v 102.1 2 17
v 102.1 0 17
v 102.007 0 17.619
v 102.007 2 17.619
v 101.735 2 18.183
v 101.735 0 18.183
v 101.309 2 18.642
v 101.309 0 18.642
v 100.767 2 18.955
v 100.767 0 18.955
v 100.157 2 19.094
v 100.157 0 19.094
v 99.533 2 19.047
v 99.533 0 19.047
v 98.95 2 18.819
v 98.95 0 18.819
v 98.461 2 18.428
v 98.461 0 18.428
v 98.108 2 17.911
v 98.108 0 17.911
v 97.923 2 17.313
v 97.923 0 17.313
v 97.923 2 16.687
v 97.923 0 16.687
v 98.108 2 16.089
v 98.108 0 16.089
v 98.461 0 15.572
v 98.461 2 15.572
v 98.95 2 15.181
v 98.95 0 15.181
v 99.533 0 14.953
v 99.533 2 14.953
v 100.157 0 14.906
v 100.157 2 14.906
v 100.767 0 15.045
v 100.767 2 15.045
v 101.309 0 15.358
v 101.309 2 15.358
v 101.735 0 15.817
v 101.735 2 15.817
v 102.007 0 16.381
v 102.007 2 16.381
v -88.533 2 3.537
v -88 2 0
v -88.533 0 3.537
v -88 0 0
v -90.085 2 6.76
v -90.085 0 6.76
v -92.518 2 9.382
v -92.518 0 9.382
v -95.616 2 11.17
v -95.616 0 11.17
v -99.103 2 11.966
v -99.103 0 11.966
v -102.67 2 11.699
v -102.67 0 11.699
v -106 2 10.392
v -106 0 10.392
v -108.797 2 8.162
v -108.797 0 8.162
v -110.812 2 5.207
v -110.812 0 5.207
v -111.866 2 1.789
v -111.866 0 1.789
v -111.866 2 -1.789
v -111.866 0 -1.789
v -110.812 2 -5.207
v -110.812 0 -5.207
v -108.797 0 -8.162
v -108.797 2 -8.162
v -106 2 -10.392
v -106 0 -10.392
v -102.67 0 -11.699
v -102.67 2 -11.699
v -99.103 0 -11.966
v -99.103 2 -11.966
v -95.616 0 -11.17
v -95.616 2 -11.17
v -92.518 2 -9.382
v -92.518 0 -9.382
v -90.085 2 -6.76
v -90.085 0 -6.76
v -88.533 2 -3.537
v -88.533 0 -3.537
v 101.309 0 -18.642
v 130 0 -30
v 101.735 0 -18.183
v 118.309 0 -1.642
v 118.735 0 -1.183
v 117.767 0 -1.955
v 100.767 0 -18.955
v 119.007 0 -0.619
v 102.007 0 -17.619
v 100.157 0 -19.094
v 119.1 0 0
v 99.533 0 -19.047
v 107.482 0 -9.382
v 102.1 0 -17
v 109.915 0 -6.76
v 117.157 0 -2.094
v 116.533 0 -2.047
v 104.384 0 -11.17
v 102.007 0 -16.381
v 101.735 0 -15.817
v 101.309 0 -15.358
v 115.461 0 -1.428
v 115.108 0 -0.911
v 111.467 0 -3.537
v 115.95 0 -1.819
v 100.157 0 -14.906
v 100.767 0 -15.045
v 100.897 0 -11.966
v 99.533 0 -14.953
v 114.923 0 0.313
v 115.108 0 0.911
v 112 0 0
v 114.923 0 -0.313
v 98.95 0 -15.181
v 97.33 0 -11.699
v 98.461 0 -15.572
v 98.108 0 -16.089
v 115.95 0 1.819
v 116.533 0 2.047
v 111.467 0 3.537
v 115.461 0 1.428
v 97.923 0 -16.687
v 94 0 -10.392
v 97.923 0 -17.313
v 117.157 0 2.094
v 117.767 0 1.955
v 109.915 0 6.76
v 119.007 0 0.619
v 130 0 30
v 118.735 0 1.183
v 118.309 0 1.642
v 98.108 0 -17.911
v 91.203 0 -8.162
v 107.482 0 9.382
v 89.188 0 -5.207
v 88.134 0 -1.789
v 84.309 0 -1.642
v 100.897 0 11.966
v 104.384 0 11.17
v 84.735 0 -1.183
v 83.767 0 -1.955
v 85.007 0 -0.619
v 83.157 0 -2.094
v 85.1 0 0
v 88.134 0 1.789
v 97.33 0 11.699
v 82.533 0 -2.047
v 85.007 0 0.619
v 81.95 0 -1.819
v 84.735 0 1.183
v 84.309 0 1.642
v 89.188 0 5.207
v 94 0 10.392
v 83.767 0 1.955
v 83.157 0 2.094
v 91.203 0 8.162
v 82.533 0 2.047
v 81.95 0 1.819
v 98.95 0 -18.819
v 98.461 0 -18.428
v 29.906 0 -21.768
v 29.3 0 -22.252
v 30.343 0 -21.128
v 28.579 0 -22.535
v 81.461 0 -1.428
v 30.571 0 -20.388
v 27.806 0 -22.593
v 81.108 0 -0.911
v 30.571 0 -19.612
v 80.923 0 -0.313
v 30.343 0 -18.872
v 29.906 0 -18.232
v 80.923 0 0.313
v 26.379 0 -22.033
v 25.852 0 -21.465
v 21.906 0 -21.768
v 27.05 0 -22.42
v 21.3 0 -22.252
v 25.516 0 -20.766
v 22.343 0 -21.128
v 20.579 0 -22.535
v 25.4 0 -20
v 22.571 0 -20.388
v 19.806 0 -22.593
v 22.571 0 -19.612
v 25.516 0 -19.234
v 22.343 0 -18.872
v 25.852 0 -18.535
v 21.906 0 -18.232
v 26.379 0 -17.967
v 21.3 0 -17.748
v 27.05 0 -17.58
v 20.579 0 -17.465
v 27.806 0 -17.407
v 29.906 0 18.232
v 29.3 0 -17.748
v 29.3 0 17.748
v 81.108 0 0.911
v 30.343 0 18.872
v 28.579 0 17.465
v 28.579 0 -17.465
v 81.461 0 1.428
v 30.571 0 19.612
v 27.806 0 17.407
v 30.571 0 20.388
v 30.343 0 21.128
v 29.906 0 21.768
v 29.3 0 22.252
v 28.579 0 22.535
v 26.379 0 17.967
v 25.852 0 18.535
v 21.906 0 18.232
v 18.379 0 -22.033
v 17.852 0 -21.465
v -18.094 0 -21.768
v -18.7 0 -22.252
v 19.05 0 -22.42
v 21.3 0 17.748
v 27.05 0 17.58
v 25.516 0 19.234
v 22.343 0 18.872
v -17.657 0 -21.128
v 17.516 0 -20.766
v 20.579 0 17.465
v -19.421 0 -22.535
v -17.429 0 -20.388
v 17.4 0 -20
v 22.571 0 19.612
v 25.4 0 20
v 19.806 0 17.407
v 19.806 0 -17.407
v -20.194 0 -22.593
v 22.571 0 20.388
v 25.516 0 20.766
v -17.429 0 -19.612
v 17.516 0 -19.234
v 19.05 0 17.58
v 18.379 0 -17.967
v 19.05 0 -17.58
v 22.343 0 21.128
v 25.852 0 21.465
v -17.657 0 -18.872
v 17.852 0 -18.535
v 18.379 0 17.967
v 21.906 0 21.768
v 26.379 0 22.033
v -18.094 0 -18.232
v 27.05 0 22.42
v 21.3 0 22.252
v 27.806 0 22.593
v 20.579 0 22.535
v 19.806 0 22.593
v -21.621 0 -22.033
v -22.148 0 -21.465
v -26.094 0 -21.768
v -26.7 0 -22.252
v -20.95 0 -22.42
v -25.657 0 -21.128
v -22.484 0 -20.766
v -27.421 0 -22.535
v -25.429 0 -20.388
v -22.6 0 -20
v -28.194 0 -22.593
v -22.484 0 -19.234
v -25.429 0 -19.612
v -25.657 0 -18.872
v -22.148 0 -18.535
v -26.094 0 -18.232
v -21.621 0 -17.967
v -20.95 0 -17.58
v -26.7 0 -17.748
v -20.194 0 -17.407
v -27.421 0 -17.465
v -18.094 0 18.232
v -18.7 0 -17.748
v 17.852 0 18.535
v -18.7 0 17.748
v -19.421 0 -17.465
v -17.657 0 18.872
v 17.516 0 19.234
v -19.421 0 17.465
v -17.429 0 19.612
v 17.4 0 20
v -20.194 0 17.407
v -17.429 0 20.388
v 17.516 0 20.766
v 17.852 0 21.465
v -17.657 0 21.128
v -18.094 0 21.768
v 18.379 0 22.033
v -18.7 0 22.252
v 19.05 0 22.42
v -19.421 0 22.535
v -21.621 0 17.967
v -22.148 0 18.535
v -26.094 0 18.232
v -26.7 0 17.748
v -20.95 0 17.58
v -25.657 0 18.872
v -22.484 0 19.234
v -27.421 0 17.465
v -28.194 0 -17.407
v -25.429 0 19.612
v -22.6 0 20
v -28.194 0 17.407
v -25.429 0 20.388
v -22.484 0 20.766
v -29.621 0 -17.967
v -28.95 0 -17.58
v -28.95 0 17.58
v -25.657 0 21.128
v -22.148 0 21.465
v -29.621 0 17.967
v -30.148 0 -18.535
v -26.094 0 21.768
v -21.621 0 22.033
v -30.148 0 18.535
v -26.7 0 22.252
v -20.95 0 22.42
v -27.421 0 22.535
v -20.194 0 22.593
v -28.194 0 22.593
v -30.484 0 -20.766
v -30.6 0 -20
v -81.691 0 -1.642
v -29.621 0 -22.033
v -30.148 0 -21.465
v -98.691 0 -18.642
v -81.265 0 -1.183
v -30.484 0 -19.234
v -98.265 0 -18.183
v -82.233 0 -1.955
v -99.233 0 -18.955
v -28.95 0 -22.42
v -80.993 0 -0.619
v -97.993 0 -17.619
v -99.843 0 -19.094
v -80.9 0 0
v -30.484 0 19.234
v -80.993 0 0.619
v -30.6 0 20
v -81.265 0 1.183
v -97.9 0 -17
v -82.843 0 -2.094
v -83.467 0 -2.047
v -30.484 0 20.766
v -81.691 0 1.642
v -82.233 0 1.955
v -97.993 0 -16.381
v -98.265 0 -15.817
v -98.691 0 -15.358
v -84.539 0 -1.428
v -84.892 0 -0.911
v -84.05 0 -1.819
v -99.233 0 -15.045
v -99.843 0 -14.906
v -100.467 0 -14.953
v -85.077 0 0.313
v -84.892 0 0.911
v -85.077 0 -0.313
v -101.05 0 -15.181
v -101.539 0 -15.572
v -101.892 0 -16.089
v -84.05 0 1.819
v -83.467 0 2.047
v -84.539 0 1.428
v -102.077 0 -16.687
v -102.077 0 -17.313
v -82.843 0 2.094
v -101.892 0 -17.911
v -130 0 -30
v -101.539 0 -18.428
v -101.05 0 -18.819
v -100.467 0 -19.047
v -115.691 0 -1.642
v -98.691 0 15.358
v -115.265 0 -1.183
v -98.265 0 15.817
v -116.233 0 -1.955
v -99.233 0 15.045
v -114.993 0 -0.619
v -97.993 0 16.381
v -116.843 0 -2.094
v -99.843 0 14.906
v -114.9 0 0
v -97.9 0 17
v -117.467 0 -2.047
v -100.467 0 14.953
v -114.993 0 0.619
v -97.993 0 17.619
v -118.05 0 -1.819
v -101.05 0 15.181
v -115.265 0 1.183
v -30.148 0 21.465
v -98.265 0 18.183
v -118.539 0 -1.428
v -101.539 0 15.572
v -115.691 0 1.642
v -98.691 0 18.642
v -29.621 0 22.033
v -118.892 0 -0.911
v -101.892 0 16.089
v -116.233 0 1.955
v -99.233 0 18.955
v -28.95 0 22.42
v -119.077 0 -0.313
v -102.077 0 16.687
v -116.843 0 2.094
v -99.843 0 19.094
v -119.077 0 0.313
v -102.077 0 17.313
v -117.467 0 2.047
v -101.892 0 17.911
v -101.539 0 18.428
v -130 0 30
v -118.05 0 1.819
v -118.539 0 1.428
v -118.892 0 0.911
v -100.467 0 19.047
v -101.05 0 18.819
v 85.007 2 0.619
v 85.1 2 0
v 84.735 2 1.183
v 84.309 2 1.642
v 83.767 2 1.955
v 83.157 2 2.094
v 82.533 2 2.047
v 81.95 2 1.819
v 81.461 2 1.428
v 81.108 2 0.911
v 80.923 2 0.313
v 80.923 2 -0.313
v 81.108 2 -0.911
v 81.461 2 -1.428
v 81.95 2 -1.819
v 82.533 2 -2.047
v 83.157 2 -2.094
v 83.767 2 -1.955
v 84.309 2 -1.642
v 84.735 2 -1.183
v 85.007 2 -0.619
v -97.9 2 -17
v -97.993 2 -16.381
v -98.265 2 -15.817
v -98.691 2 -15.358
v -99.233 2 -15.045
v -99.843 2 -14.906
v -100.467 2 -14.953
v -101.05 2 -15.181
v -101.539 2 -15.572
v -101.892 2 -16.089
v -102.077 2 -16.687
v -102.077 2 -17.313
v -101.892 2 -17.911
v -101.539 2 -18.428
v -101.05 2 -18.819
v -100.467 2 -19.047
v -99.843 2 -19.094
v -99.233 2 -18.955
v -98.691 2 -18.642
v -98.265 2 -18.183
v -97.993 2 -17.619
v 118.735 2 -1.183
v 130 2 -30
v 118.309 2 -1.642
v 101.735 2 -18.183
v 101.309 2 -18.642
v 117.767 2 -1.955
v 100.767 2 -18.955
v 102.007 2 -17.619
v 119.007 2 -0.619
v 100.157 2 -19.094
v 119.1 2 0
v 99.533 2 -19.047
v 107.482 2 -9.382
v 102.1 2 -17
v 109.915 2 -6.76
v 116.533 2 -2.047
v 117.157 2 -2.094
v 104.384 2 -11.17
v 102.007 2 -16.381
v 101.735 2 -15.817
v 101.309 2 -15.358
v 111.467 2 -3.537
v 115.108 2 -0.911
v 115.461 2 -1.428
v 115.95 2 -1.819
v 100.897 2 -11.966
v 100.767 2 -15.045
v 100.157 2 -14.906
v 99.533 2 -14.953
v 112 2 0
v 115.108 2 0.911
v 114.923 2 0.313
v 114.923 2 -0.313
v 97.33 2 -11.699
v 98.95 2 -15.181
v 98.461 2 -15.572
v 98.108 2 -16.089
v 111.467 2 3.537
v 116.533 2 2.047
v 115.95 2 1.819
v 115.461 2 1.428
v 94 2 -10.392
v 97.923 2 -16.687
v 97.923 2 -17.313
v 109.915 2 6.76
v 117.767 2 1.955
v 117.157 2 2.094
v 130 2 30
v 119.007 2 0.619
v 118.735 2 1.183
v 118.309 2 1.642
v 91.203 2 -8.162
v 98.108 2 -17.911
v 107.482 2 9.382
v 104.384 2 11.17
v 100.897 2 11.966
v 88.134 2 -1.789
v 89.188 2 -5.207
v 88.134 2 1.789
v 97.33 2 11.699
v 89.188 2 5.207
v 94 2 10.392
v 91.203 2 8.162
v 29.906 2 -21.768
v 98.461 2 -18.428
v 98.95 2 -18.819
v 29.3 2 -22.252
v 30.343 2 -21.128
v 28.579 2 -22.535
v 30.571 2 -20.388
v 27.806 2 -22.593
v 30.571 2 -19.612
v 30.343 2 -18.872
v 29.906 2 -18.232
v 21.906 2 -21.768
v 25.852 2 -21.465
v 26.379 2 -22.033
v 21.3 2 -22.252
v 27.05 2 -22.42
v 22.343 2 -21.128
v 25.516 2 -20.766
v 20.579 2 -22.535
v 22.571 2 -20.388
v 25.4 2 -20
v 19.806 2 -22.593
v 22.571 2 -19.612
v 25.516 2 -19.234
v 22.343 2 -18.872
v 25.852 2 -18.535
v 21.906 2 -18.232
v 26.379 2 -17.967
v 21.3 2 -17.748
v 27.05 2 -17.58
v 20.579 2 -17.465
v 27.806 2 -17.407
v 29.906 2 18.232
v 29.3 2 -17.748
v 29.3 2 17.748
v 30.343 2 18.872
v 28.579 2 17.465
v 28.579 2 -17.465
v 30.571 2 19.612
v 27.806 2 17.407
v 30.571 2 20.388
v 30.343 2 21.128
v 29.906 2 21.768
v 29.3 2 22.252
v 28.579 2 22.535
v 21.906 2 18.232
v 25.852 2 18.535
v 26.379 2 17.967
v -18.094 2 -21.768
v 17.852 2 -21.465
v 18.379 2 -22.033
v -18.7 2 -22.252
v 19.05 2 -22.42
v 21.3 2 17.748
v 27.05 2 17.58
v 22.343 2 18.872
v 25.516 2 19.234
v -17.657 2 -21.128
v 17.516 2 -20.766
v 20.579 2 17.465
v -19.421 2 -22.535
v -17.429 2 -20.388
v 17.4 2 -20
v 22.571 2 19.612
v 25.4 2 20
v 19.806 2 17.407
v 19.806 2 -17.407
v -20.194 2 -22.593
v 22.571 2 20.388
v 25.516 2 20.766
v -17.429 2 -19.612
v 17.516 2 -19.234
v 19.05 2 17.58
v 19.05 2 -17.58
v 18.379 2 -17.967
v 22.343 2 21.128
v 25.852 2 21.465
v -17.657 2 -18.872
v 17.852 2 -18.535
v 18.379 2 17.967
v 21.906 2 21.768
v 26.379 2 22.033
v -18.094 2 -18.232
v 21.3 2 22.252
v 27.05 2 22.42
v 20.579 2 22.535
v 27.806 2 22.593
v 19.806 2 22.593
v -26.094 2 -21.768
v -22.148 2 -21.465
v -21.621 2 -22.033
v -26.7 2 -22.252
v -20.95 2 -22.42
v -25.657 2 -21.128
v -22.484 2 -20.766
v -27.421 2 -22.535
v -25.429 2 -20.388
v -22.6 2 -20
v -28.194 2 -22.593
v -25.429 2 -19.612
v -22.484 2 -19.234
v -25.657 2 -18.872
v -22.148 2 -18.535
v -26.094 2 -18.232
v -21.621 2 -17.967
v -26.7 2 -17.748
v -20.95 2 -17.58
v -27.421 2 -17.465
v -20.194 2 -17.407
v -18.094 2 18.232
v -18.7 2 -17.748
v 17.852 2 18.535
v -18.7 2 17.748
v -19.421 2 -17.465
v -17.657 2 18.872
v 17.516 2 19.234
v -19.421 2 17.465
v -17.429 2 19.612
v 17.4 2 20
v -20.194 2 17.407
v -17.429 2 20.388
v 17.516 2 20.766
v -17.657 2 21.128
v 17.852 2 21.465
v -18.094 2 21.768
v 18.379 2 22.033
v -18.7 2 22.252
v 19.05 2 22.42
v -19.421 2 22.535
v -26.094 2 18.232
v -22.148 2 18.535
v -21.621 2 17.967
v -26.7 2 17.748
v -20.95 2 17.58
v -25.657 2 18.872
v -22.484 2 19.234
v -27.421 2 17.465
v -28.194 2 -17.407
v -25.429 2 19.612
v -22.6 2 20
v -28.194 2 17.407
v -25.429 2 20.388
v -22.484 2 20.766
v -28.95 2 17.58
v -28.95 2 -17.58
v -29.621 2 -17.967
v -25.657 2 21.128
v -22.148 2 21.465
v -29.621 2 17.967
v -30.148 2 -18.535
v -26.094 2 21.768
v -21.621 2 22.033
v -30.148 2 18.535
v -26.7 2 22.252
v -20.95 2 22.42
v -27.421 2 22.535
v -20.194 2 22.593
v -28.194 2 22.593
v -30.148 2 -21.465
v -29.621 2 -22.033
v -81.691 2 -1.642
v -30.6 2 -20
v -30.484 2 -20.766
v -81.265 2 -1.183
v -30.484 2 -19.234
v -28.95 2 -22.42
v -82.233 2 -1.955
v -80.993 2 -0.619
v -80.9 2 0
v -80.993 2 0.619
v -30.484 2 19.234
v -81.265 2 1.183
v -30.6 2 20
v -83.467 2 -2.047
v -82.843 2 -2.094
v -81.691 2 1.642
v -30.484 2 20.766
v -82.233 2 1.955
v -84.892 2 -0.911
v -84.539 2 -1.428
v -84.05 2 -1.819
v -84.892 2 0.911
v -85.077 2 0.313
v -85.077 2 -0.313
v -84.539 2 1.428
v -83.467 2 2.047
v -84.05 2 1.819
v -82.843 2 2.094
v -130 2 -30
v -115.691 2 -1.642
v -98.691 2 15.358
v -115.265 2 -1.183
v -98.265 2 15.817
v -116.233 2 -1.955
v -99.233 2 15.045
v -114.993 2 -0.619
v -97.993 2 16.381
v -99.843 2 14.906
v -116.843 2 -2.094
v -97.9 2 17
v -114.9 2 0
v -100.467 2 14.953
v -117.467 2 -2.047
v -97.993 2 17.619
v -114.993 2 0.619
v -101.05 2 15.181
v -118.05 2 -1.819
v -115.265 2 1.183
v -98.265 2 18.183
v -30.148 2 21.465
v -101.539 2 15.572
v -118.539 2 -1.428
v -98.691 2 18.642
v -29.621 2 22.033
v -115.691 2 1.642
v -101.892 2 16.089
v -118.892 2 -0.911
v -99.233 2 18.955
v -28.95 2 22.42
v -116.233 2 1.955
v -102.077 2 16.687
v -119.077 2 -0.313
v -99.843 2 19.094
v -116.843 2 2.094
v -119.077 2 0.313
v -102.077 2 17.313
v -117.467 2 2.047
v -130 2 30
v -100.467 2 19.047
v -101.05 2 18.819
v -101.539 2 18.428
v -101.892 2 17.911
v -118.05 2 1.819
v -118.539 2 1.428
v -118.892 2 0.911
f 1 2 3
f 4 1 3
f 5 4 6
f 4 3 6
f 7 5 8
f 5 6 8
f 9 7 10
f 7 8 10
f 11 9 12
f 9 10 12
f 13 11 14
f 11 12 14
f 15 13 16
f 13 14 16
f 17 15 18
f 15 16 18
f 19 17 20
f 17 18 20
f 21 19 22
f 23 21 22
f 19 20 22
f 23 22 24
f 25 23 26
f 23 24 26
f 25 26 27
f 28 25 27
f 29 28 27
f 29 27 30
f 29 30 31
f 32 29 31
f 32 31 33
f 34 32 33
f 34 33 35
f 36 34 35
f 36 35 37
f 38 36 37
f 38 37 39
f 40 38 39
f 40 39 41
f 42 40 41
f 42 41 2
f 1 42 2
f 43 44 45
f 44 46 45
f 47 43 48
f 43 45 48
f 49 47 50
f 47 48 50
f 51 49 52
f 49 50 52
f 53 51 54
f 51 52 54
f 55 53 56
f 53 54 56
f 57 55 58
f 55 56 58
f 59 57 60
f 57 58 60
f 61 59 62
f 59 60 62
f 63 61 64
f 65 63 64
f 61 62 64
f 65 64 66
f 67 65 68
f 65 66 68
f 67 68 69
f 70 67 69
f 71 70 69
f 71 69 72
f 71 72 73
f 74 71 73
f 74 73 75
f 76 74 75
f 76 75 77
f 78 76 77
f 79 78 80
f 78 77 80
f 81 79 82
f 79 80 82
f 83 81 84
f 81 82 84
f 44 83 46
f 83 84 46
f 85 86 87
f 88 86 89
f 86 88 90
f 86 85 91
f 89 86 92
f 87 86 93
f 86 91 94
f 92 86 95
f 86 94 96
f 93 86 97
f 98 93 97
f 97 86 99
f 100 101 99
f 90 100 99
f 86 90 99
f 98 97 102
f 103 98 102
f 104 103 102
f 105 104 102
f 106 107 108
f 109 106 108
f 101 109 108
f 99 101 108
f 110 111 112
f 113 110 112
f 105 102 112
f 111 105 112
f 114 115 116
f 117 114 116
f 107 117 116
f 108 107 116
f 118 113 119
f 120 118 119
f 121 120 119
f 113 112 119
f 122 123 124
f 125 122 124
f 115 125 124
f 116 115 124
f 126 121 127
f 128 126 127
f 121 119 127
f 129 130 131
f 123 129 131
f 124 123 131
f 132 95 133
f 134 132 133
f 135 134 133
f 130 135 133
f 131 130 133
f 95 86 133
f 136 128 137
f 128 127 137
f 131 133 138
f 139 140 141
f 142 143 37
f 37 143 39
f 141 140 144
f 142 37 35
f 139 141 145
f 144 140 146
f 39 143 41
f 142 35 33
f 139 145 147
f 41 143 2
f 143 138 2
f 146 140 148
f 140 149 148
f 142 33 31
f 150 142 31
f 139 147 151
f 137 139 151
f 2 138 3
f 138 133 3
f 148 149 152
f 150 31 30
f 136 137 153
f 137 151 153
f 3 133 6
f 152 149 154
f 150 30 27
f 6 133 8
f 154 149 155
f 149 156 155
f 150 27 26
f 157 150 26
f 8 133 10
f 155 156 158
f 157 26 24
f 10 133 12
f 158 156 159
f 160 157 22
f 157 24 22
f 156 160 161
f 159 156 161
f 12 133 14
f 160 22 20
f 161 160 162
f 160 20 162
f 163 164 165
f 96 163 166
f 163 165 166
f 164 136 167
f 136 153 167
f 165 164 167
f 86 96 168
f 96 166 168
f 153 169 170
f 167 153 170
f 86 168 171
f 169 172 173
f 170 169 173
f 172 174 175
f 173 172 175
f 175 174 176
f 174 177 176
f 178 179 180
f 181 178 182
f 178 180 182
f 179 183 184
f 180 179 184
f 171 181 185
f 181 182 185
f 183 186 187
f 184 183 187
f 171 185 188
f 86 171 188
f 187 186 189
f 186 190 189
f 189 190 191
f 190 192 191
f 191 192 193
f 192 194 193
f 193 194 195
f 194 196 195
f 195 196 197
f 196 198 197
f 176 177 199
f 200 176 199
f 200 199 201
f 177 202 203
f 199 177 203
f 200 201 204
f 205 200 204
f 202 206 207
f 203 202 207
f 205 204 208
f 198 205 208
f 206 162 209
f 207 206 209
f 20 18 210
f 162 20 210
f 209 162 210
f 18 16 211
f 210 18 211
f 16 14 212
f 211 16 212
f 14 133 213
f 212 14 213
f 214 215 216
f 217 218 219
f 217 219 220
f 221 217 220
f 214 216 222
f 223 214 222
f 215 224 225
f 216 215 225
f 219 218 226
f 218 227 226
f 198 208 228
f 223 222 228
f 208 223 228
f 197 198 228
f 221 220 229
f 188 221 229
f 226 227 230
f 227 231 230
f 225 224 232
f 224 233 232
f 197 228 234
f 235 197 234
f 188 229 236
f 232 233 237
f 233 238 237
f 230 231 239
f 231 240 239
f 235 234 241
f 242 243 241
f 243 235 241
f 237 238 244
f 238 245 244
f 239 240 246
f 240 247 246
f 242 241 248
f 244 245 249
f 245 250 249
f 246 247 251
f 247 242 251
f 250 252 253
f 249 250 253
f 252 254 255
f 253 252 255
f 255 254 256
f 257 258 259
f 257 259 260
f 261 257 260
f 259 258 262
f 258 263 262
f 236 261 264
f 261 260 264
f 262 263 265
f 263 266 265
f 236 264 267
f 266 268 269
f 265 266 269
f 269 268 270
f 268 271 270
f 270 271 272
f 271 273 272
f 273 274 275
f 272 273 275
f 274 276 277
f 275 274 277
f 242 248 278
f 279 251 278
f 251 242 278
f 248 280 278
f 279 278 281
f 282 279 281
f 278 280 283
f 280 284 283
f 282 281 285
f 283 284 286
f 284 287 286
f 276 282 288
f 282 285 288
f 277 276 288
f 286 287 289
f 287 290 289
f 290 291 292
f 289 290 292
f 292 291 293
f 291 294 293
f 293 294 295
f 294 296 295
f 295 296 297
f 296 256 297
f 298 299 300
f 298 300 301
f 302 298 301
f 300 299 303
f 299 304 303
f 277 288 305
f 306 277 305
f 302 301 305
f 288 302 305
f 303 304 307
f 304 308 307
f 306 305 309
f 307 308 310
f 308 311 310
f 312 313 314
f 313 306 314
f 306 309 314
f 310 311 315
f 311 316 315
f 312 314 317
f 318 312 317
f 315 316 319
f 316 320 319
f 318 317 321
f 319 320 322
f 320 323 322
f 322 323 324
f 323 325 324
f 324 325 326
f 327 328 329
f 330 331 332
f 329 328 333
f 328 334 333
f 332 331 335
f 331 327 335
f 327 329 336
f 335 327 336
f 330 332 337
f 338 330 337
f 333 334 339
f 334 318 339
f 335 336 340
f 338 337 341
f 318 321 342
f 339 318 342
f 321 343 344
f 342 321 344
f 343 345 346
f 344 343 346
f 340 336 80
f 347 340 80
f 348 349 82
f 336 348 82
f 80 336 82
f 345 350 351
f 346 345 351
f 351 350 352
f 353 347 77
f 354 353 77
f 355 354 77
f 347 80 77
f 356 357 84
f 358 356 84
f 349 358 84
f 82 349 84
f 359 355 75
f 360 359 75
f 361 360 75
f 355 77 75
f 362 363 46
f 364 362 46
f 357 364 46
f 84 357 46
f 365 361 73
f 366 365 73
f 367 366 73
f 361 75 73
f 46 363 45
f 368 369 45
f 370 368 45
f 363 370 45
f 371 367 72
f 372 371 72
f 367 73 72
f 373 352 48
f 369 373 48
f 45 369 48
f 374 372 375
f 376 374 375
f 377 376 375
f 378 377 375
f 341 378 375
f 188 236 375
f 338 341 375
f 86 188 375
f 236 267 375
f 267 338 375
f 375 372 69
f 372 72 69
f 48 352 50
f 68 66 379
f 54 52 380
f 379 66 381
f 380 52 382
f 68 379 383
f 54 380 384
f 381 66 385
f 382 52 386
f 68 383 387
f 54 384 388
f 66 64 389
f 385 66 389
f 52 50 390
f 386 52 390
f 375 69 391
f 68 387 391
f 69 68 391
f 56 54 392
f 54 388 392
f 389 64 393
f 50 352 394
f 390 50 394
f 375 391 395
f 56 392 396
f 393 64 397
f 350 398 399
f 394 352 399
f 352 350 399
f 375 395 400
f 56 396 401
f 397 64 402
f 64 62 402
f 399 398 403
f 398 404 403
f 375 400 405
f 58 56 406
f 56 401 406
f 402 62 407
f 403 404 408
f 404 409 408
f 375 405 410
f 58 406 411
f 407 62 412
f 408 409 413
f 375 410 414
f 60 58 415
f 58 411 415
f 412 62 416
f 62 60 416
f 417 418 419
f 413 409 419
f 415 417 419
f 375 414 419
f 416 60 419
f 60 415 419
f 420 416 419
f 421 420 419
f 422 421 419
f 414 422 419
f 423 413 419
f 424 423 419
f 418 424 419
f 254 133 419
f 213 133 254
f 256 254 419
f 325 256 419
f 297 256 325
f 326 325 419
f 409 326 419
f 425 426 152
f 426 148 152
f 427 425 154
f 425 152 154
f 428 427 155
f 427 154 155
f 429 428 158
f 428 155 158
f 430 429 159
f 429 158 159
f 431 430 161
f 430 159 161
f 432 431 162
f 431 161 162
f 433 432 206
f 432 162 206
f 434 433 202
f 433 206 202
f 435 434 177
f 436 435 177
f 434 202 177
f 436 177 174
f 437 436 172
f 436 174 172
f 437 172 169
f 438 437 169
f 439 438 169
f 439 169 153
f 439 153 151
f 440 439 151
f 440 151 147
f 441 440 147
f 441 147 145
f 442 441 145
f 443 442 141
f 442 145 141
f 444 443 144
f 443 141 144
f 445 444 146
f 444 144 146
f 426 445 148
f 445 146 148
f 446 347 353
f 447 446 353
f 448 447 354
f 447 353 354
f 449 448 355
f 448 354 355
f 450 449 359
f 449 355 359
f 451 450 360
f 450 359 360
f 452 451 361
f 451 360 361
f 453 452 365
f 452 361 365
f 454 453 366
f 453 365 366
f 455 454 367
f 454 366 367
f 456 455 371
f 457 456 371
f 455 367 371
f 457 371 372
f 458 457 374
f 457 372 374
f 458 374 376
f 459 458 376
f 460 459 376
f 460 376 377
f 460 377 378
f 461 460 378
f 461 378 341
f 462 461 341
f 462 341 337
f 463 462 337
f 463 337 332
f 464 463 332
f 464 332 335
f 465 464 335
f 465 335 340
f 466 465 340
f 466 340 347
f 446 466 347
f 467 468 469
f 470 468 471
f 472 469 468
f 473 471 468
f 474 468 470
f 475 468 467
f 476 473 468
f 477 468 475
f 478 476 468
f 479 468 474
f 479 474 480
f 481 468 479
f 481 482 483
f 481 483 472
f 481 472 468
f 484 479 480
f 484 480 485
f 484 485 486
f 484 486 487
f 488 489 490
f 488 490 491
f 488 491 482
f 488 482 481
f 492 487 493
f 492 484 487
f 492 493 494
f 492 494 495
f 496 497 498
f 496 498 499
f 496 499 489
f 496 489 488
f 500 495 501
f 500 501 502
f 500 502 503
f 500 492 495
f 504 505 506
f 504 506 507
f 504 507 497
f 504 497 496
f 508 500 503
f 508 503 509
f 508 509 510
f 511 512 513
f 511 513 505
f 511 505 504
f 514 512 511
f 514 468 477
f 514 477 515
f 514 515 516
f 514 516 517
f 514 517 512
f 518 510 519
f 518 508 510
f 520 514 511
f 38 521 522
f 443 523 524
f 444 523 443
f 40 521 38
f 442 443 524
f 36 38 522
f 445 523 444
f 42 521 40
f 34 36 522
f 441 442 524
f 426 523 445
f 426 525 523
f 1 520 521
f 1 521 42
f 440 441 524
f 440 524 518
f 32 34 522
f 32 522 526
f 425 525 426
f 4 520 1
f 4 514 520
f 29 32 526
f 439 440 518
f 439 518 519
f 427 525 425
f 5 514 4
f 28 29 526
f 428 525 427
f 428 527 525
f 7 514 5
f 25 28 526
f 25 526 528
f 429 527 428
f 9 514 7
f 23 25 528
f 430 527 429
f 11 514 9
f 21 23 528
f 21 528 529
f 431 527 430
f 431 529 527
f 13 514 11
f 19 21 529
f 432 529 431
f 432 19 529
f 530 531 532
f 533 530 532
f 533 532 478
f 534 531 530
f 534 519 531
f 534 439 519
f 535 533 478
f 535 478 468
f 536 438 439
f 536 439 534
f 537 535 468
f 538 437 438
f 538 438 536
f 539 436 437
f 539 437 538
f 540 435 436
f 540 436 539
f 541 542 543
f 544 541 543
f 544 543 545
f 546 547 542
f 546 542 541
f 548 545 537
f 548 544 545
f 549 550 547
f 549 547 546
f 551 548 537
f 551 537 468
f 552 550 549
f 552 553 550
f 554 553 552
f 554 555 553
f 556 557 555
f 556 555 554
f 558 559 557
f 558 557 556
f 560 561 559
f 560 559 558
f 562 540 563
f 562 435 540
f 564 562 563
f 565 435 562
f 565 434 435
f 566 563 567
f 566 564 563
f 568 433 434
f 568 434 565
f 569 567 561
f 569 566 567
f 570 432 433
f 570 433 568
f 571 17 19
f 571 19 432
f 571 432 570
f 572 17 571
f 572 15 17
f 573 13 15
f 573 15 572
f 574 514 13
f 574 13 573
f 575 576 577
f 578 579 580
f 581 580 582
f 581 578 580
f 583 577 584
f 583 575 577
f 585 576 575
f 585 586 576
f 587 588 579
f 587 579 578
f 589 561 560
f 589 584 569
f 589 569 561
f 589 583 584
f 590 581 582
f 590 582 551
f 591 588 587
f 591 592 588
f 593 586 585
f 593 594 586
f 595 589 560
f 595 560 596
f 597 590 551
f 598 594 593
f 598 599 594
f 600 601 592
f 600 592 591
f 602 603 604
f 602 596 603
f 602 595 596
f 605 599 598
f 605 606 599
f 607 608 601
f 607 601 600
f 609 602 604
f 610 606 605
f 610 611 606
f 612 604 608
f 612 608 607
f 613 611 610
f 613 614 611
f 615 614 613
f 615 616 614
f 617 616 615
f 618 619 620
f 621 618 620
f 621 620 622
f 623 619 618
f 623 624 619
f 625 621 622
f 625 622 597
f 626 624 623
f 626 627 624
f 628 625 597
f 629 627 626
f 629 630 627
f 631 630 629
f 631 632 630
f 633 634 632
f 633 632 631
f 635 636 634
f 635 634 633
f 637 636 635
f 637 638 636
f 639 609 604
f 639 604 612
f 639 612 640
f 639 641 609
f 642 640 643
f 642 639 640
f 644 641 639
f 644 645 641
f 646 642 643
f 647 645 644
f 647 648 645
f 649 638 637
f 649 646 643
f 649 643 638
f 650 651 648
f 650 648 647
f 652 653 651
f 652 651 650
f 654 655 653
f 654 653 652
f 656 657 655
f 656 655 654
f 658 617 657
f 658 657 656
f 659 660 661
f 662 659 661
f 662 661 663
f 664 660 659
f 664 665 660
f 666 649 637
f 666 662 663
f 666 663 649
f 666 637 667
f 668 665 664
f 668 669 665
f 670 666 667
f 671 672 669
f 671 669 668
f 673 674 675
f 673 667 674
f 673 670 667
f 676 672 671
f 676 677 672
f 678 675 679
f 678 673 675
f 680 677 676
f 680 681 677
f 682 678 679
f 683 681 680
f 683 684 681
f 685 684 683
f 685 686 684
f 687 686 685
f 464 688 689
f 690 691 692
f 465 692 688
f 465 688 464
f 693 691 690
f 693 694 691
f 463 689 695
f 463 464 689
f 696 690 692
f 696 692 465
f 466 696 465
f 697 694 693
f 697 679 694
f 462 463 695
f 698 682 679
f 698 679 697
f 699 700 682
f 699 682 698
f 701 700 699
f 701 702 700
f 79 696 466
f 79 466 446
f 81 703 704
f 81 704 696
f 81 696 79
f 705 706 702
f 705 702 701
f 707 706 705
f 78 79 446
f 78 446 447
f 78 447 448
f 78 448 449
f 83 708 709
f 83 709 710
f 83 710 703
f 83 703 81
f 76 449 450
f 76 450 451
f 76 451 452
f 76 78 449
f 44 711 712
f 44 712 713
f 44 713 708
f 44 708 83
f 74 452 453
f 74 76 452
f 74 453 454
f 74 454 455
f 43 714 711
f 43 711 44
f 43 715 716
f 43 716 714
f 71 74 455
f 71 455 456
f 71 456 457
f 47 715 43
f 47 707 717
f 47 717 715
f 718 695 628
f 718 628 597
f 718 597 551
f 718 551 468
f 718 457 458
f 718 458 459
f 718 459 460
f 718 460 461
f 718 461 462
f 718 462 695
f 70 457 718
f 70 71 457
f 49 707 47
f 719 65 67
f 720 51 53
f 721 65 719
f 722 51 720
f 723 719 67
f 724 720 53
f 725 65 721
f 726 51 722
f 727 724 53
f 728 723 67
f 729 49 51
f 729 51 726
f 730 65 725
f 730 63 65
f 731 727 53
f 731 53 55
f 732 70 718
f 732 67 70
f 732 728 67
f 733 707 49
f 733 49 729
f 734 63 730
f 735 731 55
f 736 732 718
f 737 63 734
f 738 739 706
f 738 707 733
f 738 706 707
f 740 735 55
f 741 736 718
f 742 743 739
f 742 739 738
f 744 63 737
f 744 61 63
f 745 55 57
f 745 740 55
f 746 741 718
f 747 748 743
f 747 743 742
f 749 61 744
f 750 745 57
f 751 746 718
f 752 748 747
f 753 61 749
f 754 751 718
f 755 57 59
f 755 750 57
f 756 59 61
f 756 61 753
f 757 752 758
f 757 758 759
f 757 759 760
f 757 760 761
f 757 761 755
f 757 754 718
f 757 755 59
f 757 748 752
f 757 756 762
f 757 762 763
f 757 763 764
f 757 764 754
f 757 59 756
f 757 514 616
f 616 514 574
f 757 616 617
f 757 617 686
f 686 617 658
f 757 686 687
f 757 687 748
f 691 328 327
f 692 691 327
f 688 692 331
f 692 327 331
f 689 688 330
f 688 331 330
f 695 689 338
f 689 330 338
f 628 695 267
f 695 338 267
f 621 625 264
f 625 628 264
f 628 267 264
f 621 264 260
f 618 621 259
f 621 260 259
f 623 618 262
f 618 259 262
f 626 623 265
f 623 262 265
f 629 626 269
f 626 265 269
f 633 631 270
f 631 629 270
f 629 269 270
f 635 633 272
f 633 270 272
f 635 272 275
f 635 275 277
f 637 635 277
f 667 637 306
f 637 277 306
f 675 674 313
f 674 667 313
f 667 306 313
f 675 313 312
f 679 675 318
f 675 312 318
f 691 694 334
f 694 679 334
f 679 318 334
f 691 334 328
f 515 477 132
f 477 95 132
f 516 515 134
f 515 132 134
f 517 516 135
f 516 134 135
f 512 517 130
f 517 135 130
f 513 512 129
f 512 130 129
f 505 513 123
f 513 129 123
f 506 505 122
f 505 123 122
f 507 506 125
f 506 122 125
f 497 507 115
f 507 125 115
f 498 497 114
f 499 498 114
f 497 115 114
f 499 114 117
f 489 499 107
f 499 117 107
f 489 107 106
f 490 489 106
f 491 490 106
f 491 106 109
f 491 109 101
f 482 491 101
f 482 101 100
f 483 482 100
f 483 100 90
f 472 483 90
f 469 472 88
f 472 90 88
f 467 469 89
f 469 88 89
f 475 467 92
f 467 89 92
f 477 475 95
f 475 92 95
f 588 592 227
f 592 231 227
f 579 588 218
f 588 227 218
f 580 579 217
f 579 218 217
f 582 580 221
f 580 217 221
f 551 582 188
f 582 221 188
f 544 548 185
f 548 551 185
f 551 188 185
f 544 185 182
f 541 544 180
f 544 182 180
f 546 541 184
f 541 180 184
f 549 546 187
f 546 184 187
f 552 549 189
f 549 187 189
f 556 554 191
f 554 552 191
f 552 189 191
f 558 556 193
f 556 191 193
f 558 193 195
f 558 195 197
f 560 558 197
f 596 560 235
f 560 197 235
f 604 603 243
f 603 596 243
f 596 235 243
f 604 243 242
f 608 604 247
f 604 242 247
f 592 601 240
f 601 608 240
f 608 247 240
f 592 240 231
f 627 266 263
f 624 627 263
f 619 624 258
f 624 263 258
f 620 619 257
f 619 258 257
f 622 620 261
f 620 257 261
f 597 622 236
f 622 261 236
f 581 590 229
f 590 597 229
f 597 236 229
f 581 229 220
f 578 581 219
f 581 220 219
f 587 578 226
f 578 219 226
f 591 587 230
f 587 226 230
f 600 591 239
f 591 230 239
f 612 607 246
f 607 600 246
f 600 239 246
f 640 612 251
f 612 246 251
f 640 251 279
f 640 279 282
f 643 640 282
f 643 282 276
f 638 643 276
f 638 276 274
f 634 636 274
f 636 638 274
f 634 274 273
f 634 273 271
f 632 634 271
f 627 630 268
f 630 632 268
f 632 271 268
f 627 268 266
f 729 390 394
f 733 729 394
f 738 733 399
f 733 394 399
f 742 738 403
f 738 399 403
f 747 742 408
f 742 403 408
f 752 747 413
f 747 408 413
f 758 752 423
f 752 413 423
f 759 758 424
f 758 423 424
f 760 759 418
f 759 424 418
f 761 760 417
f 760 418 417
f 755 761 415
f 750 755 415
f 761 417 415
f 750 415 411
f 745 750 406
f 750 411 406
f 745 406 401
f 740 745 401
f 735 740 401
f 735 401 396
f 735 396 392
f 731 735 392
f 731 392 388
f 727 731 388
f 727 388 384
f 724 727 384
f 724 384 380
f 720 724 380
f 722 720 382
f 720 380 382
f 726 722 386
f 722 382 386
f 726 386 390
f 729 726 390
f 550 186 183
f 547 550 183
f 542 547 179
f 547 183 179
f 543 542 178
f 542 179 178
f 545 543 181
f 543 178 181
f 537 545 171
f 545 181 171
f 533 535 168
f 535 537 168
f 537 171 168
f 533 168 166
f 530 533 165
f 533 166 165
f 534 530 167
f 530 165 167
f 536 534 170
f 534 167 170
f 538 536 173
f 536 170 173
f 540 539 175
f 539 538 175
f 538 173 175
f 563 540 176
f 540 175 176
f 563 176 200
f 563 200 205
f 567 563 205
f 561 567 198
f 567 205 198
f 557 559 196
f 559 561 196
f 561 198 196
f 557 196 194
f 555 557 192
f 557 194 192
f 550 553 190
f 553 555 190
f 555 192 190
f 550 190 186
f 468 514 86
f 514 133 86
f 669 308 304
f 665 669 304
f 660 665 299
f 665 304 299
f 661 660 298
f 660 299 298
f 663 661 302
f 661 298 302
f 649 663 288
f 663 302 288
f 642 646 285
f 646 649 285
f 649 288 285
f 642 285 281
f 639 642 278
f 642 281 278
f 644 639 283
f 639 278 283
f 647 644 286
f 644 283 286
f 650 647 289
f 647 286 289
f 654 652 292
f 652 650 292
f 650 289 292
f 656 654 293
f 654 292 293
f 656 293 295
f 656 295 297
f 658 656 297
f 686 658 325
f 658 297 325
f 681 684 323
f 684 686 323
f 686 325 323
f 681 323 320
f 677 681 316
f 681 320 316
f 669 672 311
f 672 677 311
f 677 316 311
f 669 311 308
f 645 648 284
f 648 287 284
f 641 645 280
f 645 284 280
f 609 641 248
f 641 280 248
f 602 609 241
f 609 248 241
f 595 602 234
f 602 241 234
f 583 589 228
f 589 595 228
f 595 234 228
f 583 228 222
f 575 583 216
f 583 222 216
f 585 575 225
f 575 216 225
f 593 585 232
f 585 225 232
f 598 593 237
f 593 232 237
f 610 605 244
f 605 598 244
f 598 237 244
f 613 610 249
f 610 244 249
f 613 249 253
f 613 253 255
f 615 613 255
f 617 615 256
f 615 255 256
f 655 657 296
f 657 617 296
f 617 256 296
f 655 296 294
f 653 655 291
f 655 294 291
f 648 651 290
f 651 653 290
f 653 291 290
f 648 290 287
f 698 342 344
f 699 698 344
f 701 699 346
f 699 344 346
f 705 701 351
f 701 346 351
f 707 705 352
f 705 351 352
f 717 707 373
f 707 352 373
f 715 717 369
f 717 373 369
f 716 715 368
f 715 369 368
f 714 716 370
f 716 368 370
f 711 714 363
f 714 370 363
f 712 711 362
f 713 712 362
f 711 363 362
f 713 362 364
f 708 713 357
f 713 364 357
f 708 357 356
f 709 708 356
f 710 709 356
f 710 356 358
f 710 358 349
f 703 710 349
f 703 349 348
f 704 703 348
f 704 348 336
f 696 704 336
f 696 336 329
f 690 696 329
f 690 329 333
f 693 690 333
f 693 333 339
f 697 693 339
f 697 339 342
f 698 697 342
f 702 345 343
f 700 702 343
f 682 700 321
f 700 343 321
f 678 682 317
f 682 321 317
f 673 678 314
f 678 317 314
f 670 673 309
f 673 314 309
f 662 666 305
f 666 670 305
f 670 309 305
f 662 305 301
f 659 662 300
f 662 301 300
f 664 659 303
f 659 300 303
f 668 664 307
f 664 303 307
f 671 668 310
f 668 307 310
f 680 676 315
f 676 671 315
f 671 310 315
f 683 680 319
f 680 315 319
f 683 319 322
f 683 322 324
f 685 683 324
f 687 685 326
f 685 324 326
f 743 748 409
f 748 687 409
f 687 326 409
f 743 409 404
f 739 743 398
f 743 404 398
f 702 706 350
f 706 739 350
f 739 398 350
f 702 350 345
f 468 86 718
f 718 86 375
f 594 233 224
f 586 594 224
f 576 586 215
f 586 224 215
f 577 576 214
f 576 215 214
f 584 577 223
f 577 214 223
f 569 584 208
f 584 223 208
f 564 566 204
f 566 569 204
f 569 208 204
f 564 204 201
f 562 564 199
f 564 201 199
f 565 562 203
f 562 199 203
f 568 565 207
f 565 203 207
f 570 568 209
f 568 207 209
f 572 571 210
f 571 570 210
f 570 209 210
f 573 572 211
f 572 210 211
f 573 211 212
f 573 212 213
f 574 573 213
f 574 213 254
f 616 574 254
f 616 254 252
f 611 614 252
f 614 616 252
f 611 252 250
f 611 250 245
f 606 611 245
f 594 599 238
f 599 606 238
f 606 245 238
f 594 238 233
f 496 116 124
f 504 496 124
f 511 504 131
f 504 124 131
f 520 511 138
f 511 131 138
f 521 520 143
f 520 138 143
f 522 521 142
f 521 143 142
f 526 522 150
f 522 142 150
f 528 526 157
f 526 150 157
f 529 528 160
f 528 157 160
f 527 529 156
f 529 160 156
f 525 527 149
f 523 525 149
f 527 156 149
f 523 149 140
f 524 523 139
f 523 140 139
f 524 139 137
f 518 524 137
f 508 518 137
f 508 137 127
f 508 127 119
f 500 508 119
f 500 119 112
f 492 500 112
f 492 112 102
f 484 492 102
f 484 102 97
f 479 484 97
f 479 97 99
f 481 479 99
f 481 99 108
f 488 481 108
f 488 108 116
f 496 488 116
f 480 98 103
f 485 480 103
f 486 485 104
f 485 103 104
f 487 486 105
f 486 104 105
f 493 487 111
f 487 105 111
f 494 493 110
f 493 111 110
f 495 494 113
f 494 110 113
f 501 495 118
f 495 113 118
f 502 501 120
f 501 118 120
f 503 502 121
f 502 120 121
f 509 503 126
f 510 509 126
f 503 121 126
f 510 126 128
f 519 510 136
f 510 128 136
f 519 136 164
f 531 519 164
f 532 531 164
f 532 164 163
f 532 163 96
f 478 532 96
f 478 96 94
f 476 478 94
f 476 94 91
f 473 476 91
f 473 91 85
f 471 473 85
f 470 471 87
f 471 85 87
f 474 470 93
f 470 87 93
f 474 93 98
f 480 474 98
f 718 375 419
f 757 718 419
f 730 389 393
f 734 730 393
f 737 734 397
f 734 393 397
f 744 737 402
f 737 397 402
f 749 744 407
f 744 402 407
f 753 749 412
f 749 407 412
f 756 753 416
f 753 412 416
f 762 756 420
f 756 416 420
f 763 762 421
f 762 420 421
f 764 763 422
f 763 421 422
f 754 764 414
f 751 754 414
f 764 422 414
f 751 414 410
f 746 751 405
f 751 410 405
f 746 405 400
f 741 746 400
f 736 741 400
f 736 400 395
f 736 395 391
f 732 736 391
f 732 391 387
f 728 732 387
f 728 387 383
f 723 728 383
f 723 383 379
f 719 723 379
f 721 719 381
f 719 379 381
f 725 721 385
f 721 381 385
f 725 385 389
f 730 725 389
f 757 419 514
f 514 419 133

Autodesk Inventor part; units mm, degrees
ref_plane "YZ Plane" through (0, 0, 0) normal (1, 0, 0) x (0, 1, 0)
ref_plane "XZ Plane" through (0, 0, 0) normal (0, 1, 0) x (-1, 0, 0)
ref_plane "XY Plane" through (0, 0, 0) normal (0, 0, 1) x (1, 0, 0)
sketch "スケッチ1" plane through (0, 0, 0) normal (0, 1, 0) x (-1, 0, 0)
  line L0 (-130, -30) -> (130, -30)
  line L1 (130, -30) -> (130, 30)
  line L2 (130, 30) -> (-130, 30)
  line L3 (-130, 30) -> (-130, -30)
  line L4 (-130, -30) -> (130, 30) construction
  line L5 (130, -30) -> (-130, 30) construction
  circle A0 centre (-28, -20) radius 2.6
  circle A1 centre (-20, -20) radius 2.6
  circle A2 centre (20, -20) radius 2.6
  circle A3 centre (28, -20) radius 2.6
  circle A4 centre (-28, 20) radius 2.6
  circle A5 centre (-20, 20) radius 2.6
  circle A6 centre (20, 20) radius 2.6
  circle A7 centre (28, 20) radius 2.6
  point P0 (0, 0)
  dimension "d0" = 260
  dimension "d1" = 60
  dimension "d2" = 5.2
  dimension "d4" = 5.2
  dimension "d5" = 8
  dimension "d6" = 5.2
  dimension "d7" = 40
  dimension "d8" = 5.2
  dimension "d9" = 8
  dimension "d10" = 5.2
  dimension "d12" = 5.2
  dimension "d13" = 5.2
  dimension "d14" = 5.2
  dimension "d16" = 40
  dimension "d17" = 8
  dimension "d18" = 8
  dimension "d20" = 10
  dimension "d21" = 158
  dimension "d22" = 50
  dimension "d23" = 158
extrude "押し出し1" add sketch "スケッチ1" along normal blind 2
sketch "スケッチ2" plane through (0, 0, 0) normal (0, -1, 0) x (1, 0, 0)
  circle A0 centre (-100, 0) radius 12
  circle A1 centre (100, 0) radius 12
  line L0 (-130, -30) -> (-130, 30) projected
  line L1 (130, 30) -> (130, -30) projected
  point P0 (0, 0)
  dimension "d26" = 24
  dimension "d27" = 24
  dimension "d28" = 30
  dimension "d29" = 30
extrude "押し出し2" cut sketch "スケッチ2" against normal blind 10
sketch "スケッチ3" plane through (0, 0, 0) normal (0, -1, 0) x (1, 0, 0)
  circle A0 centre (-100, 0) radius 12 projected
  circle A1 centre (-100, 17) radius 2.1
  circle A2 centre (-83, 0) radius 2.1
  circle A3 centre (-100, -17) radius 2.1
  circle A4 centre (-117, 0) radius 2.1
  circle A5 centre (100, 0) radius 12 projected
  circle A6 centre (100, 17) radius 2.1
  circle A7 centre (117, 0) radius 2.1
  circle A8 centre (83, 0) radius 2.1
  circle A9 centre (100, -17) radius 2.1
  point P0 (0, 0)
  dimension "d33" = 4.2
  dimension "d34" = 4.2
  dimension "d35" = 4.2
  dimension "d36" = 4.2
  dimension "d38" = 4.2
  dimension "d39" = 4.2
  dimension "d40" = 4.2
  dimension "d41" = 4.2
extrude "押し出し3" cut sketch "スケッチ3" against normal blind 10 contours A1 | A2 | A3 | A4 | A6 | A7 | A8 | A9
properties part number "UpperArm2"
